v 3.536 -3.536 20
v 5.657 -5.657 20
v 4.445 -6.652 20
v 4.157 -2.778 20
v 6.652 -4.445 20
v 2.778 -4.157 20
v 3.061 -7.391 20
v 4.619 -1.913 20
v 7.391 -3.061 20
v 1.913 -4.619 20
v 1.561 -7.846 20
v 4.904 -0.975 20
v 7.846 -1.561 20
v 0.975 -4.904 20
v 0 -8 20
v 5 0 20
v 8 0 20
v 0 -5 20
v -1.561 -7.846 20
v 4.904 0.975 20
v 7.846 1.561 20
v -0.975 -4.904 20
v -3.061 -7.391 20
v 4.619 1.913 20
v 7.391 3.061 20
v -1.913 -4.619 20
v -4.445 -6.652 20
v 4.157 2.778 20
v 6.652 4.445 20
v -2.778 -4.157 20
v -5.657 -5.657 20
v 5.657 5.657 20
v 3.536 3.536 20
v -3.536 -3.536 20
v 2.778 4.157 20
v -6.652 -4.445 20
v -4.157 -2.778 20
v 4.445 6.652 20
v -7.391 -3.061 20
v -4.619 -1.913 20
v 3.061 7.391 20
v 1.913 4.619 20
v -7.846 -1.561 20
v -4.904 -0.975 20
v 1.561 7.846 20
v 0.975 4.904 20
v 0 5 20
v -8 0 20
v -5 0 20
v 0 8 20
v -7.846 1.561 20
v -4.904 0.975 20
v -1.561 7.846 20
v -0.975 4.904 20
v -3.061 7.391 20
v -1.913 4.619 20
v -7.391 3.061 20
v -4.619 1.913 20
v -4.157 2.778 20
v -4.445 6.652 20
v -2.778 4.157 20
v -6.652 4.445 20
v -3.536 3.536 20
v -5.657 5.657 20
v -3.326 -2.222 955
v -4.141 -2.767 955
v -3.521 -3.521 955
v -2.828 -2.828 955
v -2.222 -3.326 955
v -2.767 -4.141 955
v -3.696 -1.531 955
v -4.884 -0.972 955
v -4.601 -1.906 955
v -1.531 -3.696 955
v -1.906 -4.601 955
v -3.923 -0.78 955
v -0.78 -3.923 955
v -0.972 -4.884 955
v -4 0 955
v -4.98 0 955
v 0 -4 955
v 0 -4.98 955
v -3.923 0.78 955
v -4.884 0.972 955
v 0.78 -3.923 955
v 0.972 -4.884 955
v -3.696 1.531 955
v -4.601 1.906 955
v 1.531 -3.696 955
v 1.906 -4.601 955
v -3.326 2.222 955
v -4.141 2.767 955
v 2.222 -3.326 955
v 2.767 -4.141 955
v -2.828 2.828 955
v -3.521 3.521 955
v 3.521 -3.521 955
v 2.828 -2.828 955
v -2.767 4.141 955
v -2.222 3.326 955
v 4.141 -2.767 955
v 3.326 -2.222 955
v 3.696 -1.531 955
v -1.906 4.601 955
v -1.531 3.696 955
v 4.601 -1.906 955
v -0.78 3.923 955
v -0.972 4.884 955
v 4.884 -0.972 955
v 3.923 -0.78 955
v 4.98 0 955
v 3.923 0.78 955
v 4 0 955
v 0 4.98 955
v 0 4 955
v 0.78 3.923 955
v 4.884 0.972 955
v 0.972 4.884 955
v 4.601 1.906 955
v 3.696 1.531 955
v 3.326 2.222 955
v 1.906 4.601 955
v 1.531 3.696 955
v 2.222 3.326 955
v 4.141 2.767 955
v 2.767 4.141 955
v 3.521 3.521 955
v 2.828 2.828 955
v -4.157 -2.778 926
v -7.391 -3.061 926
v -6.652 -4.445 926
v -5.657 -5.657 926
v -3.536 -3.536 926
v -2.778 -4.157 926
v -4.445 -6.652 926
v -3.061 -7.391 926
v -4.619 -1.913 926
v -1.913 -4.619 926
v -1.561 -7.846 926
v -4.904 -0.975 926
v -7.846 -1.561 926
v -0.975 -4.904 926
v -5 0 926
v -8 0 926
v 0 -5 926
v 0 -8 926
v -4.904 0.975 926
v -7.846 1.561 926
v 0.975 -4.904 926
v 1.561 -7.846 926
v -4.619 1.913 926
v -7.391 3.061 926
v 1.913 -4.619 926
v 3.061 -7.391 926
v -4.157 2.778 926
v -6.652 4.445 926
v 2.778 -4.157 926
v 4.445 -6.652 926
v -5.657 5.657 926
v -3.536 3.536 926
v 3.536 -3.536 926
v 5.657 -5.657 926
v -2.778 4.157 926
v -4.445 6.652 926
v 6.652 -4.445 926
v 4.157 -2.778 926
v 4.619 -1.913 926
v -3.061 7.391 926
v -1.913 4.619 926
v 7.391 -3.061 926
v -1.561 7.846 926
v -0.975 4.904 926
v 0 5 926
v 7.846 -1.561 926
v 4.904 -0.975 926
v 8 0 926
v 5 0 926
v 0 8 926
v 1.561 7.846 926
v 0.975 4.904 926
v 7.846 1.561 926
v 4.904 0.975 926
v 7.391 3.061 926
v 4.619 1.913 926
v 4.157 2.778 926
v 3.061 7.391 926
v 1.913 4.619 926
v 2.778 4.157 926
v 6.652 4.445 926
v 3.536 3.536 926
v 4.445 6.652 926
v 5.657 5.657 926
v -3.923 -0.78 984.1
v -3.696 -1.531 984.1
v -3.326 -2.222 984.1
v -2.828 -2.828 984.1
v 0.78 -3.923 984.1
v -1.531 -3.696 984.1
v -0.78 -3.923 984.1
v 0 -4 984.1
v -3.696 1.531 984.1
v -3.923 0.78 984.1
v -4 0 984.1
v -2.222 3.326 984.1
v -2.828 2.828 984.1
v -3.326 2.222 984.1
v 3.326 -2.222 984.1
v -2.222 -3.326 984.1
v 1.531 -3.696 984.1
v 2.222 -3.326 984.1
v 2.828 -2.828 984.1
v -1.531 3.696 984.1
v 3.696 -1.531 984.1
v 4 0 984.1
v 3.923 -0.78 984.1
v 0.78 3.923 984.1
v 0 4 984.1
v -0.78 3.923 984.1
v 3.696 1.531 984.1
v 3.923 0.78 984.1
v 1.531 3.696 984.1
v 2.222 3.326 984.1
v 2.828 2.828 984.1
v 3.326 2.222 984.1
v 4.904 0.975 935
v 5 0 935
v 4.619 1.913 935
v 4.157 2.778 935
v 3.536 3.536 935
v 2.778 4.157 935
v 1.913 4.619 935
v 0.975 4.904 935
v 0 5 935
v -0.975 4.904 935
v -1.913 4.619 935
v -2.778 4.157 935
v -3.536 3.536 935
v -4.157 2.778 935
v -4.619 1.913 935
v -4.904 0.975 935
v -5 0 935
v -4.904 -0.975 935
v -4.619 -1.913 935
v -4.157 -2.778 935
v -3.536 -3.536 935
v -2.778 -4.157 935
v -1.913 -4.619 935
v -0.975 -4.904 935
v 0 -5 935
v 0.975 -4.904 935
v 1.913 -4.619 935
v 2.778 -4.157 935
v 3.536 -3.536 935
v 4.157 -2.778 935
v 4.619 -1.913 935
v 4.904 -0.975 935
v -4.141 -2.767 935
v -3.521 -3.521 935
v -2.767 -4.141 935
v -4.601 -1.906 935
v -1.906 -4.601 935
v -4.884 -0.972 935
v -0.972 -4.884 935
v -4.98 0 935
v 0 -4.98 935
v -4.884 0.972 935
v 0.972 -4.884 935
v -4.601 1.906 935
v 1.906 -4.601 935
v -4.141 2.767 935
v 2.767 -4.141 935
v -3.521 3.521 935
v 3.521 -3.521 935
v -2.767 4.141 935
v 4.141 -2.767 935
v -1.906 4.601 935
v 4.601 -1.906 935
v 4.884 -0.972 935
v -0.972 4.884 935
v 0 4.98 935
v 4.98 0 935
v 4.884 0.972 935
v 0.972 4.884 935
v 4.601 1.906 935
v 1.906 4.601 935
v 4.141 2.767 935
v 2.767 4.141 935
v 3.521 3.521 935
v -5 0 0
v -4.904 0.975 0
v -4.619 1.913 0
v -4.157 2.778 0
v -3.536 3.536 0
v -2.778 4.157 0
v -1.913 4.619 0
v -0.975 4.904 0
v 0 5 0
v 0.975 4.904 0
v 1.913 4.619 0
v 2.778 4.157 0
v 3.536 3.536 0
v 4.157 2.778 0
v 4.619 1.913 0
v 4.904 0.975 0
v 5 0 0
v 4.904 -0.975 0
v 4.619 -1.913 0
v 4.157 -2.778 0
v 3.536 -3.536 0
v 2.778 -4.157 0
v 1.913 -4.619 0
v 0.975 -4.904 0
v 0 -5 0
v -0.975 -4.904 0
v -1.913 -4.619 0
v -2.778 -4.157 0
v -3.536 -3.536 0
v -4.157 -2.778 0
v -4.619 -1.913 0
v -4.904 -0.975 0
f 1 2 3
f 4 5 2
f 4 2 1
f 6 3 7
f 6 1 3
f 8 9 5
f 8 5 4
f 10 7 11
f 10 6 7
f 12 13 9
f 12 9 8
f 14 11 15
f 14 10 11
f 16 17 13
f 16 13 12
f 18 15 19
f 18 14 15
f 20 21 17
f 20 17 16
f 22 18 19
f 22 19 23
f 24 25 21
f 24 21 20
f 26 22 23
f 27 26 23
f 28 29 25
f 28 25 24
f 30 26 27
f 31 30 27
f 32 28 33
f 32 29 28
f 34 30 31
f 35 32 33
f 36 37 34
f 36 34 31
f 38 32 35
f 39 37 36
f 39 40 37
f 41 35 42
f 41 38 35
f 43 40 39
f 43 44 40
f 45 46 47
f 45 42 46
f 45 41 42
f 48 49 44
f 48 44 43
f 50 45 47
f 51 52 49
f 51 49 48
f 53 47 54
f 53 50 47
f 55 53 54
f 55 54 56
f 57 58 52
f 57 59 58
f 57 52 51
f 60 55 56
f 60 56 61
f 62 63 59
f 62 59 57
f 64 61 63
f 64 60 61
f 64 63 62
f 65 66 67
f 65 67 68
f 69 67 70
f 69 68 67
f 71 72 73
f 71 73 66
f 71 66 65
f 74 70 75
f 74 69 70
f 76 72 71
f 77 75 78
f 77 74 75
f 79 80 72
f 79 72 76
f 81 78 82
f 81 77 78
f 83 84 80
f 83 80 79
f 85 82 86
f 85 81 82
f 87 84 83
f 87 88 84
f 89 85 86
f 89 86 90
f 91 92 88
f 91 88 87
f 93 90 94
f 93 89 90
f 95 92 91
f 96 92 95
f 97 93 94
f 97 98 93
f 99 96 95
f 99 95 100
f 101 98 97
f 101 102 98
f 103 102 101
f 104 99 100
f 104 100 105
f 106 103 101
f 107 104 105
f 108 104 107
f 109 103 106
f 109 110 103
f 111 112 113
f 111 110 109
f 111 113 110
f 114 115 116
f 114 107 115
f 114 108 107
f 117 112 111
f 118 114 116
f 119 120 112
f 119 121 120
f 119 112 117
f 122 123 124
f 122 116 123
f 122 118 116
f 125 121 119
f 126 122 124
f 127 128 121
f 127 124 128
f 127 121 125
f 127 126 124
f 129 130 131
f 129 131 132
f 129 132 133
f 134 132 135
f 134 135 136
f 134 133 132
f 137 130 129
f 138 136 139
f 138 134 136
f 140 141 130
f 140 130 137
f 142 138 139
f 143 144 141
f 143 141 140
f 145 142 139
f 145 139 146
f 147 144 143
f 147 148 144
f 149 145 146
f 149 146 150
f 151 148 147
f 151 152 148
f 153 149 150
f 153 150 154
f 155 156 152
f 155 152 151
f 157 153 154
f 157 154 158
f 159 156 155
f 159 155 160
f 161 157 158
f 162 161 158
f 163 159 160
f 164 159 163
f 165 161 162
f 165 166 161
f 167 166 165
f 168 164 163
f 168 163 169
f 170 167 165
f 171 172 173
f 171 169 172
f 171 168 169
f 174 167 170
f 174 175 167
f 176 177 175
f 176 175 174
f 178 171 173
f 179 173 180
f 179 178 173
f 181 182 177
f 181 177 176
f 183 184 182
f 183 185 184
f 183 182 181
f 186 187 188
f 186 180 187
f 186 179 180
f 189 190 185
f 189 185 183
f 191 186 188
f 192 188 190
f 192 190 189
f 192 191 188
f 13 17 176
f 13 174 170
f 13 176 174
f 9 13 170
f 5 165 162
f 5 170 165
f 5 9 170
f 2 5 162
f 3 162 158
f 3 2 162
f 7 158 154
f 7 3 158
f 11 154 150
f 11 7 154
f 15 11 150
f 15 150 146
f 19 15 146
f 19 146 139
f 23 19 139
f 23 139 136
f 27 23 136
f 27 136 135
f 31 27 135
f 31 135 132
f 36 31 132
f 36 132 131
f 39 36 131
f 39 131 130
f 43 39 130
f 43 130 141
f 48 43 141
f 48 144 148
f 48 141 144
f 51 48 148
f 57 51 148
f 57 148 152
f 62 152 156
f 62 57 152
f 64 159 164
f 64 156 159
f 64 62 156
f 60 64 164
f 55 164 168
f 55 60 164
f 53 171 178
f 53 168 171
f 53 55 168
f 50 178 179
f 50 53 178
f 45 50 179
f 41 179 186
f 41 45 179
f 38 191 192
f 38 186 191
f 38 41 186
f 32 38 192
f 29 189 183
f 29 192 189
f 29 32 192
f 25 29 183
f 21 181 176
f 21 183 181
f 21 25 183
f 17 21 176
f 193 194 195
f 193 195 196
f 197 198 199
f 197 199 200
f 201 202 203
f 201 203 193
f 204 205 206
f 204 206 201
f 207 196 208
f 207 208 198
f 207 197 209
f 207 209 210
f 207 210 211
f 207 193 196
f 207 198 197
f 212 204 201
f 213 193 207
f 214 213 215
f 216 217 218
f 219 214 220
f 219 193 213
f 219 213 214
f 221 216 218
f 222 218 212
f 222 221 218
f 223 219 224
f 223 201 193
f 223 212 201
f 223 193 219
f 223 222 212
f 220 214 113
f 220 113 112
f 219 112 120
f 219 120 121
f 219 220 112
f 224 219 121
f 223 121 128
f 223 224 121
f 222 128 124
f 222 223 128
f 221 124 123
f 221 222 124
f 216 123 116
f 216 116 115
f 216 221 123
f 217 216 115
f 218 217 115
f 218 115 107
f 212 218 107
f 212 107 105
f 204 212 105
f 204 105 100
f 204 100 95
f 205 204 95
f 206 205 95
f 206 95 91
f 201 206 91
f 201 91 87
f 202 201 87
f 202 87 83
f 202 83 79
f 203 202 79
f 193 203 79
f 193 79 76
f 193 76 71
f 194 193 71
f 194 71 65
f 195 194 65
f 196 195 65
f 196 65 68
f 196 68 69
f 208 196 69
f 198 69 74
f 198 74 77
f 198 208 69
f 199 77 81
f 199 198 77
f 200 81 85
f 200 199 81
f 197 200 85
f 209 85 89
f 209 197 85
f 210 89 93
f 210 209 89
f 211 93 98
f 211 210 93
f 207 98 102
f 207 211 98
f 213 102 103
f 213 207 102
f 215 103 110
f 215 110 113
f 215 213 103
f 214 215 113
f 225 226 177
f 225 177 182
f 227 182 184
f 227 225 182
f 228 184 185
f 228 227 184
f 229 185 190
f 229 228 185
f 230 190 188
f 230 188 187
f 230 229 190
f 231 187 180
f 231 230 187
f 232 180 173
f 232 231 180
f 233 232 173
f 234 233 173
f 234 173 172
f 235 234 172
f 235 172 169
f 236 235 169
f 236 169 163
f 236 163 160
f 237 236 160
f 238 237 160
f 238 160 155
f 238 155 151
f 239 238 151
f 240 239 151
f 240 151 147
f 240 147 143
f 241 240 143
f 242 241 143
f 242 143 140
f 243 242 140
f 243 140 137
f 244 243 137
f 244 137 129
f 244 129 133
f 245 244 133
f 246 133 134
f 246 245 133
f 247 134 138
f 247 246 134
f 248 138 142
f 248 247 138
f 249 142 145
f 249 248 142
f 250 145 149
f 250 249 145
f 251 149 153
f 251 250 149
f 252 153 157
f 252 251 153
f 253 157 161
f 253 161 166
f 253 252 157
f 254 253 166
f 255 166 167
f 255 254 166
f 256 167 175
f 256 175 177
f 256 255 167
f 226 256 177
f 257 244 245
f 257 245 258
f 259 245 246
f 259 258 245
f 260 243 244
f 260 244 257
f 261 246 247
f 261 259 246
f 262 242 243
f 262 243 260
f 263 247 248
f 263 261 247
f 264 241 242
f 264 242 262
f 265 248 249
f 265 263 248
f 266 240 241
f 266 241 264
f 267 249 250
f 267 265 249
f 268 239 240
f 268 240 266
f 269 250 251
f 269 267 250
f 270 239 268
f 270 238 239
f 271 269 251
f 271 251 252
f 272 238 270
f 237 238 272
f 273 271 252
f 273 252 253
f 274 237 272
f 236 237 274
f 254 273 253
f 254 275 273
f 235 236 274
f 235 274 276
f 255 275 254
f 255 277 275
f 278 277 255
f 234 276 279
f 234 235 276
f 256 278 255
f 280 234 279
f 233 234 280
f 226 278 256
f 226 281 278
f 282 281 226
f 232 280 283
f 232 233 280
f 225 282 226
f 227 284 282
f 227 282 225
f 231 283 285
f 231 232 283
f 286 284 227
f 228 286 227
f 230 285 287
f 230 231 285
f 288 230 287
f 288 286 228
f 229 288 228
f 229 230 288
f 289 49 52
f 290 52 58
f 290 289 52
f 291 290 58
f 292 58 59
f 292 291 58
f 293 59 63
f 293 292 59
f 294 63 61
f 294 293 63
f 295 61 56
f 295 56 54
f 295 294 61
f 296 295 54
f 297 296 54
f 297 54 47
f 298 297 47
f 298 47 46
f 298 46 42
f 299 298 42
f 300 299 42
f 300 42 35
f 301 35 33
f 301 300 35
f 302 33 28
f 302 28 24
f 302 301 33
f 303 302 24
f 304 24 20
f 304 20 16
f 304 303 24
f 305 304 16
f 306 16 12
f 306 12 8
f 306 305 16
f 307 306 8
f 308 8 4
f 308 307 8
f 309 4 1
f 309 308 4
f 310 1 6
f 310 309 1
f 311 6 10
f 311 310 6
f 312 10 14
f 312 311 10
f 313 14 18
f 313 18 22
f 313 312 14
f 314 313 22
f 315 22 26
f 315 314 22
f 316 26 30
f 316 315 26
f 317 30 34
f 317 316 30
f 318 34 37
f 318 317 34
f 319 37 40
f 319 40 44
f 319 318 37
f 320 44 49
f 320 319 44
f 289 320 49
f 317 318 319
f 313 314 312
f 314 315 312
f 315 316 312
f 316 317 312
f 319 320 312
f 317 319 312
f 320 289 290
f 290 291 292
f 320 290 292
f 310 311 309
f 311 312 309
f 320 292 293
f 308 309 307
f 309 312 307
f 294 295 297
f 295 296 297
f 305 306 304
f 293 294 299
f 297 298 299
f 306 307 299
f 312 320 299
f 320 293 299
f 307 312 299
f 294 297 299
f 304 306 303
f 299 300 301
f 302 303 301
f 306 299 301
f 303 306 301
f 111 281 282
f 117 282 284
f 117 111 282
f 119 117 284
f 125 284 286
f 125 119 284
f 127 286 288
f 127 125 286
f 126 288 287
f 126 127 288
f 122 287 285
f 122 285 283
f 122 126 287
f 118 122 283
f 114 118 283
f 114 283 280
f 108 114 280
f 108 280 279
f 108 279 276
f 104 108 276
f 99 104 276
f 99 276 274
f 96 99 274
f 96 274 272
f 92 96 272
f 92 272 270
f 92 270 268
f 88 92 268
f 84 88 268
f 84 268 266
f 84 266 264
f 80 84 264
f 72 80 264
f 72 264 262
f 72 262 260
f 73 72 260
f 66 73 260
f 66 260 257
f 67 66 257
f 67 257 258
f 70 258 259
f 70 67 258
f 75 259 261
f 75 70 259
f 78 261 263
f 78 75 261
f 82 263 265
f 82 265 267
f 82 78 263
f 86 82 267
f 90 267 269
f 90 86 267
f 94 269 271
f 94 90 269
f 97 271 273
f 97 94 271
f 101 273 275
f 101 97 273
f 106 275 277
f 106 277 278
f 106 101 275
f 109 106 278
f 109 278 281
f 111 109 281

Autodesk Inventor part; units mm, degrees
ref_plane "YZ Plane" through (0, 0, 0) normal (1, 0, 0) x (0, 1, 0)
ref_plane "XZ Plane" through (0, 0, 0) normal (0, 1, 0) x (-1, 0, 0)
ref_plane "XY Plane" through (0, 0, 0) normal (0, 0, 1) x (1, 0, 0)
sketch "Szkic1" plane through (0, 0, 0) normal (0, 0, 1) x (1, 0, 0)
  circle A0 centre (0, 0) radius 8
  dimension "d0" = 16
extrude "Wyciągnięcie proste2" add sketch "Szkic1" along normal blind 1000
sketch "Szkic2" plane through (0, 0, 1000) normal (0, 0, 1) x (1, 0, 0)
  circle A0 centre (0, 0) radius 4
  circle A1 centre (0, 0) radius 8 projected
  dimension "d7" = 8
extrude "Wyciągnięcie proste3" cut sketch "Szkic2" against normal blind 30
sketch "Szkic3" plane through (0, 0, 970) normal (0, 0, 1) x (1, 0, 0)
  circle A0 centre (0, 0) radius 8 projected
  circle A1 centre (0, 0) radius 5
  dimension "d10" = 10
extrude "Wyciągnięcie proste4" cut sketch "Szkic3" against normal blind 30
sketch "Szkic4" plane through (0, 0, 970) normal (0, 0, 1) x (1, 0, 0)
  circle A0 centre (0, 0) radius 5 projected
  circle A1 centre (0, 0) radius 4.98
  dimension "d13" = 9.96
extrude "Wyciągnięcie proste5" cut sketch "Szkic4" against normal blind 20
thread "Gwint2" size "M10x1.5" class "6g" standard "ANSI Metric M Profile" full length
sketch "Szkic5" plane through (0, 0, 0) normal (0, 0, -1) x (-1, 0, 0)
  circle A0 centre (0, 0) radius 5
  circle A1 centre (0, 0) radius 8 projected
  dimension "d18" = 10
extrude "Wyciągnięcie proste6" cut sketch "Szkic5" against normal blind 20
thread "Gwint3" size "TR16x4" class "7e" standard "ISO Metric Trapezoidal Threads" full length
sketch "Szkic6" plane through (0, 0, 940) normal (0, 0, 1) x (1, 0, 0)
  circle A0 centre (0, 0) radius 5 projected
  circle A1 centre (0, 0) radius 8 projected
extrude "Wyciągnięcie proste7" cut sketch "Szkic6" against normal blind 14
sketch "Szkic7" plane through (0, 0, 950) normal (0, 0, 1) x (1, 0, 0)
  circle A0 centre (0, 0) radius 4.98 projected
  circle A1 centre (0, 0) radius 5 projected
extrude "Wyciągnięcie proste8" cut sketch "Szkic7" against normal blind 15
sketch "Szkic8" plane through (0, 0, 970) normal (0, 0, 1) x (1, 0, 0)
  circle A0 centre (0, 0) radius 4.98 projected
  circle A1 centre (0, 0) radius 4 projected
extrude "Wyciągnięcie proste9" cut sketch "Szkic8" against normal blind 15
sketch "Szkic9" plane through (0, 0, 1000) normal (0, 0, 1) x (1, 0, 0)
  circle A0 centre (0, 0) radius 4 projected
extrude "Wyciągnięcie proste10" cut sketch "Szkic9" against normal blind 15.9
properties part number "Śruba trapezowa fi10mm"
